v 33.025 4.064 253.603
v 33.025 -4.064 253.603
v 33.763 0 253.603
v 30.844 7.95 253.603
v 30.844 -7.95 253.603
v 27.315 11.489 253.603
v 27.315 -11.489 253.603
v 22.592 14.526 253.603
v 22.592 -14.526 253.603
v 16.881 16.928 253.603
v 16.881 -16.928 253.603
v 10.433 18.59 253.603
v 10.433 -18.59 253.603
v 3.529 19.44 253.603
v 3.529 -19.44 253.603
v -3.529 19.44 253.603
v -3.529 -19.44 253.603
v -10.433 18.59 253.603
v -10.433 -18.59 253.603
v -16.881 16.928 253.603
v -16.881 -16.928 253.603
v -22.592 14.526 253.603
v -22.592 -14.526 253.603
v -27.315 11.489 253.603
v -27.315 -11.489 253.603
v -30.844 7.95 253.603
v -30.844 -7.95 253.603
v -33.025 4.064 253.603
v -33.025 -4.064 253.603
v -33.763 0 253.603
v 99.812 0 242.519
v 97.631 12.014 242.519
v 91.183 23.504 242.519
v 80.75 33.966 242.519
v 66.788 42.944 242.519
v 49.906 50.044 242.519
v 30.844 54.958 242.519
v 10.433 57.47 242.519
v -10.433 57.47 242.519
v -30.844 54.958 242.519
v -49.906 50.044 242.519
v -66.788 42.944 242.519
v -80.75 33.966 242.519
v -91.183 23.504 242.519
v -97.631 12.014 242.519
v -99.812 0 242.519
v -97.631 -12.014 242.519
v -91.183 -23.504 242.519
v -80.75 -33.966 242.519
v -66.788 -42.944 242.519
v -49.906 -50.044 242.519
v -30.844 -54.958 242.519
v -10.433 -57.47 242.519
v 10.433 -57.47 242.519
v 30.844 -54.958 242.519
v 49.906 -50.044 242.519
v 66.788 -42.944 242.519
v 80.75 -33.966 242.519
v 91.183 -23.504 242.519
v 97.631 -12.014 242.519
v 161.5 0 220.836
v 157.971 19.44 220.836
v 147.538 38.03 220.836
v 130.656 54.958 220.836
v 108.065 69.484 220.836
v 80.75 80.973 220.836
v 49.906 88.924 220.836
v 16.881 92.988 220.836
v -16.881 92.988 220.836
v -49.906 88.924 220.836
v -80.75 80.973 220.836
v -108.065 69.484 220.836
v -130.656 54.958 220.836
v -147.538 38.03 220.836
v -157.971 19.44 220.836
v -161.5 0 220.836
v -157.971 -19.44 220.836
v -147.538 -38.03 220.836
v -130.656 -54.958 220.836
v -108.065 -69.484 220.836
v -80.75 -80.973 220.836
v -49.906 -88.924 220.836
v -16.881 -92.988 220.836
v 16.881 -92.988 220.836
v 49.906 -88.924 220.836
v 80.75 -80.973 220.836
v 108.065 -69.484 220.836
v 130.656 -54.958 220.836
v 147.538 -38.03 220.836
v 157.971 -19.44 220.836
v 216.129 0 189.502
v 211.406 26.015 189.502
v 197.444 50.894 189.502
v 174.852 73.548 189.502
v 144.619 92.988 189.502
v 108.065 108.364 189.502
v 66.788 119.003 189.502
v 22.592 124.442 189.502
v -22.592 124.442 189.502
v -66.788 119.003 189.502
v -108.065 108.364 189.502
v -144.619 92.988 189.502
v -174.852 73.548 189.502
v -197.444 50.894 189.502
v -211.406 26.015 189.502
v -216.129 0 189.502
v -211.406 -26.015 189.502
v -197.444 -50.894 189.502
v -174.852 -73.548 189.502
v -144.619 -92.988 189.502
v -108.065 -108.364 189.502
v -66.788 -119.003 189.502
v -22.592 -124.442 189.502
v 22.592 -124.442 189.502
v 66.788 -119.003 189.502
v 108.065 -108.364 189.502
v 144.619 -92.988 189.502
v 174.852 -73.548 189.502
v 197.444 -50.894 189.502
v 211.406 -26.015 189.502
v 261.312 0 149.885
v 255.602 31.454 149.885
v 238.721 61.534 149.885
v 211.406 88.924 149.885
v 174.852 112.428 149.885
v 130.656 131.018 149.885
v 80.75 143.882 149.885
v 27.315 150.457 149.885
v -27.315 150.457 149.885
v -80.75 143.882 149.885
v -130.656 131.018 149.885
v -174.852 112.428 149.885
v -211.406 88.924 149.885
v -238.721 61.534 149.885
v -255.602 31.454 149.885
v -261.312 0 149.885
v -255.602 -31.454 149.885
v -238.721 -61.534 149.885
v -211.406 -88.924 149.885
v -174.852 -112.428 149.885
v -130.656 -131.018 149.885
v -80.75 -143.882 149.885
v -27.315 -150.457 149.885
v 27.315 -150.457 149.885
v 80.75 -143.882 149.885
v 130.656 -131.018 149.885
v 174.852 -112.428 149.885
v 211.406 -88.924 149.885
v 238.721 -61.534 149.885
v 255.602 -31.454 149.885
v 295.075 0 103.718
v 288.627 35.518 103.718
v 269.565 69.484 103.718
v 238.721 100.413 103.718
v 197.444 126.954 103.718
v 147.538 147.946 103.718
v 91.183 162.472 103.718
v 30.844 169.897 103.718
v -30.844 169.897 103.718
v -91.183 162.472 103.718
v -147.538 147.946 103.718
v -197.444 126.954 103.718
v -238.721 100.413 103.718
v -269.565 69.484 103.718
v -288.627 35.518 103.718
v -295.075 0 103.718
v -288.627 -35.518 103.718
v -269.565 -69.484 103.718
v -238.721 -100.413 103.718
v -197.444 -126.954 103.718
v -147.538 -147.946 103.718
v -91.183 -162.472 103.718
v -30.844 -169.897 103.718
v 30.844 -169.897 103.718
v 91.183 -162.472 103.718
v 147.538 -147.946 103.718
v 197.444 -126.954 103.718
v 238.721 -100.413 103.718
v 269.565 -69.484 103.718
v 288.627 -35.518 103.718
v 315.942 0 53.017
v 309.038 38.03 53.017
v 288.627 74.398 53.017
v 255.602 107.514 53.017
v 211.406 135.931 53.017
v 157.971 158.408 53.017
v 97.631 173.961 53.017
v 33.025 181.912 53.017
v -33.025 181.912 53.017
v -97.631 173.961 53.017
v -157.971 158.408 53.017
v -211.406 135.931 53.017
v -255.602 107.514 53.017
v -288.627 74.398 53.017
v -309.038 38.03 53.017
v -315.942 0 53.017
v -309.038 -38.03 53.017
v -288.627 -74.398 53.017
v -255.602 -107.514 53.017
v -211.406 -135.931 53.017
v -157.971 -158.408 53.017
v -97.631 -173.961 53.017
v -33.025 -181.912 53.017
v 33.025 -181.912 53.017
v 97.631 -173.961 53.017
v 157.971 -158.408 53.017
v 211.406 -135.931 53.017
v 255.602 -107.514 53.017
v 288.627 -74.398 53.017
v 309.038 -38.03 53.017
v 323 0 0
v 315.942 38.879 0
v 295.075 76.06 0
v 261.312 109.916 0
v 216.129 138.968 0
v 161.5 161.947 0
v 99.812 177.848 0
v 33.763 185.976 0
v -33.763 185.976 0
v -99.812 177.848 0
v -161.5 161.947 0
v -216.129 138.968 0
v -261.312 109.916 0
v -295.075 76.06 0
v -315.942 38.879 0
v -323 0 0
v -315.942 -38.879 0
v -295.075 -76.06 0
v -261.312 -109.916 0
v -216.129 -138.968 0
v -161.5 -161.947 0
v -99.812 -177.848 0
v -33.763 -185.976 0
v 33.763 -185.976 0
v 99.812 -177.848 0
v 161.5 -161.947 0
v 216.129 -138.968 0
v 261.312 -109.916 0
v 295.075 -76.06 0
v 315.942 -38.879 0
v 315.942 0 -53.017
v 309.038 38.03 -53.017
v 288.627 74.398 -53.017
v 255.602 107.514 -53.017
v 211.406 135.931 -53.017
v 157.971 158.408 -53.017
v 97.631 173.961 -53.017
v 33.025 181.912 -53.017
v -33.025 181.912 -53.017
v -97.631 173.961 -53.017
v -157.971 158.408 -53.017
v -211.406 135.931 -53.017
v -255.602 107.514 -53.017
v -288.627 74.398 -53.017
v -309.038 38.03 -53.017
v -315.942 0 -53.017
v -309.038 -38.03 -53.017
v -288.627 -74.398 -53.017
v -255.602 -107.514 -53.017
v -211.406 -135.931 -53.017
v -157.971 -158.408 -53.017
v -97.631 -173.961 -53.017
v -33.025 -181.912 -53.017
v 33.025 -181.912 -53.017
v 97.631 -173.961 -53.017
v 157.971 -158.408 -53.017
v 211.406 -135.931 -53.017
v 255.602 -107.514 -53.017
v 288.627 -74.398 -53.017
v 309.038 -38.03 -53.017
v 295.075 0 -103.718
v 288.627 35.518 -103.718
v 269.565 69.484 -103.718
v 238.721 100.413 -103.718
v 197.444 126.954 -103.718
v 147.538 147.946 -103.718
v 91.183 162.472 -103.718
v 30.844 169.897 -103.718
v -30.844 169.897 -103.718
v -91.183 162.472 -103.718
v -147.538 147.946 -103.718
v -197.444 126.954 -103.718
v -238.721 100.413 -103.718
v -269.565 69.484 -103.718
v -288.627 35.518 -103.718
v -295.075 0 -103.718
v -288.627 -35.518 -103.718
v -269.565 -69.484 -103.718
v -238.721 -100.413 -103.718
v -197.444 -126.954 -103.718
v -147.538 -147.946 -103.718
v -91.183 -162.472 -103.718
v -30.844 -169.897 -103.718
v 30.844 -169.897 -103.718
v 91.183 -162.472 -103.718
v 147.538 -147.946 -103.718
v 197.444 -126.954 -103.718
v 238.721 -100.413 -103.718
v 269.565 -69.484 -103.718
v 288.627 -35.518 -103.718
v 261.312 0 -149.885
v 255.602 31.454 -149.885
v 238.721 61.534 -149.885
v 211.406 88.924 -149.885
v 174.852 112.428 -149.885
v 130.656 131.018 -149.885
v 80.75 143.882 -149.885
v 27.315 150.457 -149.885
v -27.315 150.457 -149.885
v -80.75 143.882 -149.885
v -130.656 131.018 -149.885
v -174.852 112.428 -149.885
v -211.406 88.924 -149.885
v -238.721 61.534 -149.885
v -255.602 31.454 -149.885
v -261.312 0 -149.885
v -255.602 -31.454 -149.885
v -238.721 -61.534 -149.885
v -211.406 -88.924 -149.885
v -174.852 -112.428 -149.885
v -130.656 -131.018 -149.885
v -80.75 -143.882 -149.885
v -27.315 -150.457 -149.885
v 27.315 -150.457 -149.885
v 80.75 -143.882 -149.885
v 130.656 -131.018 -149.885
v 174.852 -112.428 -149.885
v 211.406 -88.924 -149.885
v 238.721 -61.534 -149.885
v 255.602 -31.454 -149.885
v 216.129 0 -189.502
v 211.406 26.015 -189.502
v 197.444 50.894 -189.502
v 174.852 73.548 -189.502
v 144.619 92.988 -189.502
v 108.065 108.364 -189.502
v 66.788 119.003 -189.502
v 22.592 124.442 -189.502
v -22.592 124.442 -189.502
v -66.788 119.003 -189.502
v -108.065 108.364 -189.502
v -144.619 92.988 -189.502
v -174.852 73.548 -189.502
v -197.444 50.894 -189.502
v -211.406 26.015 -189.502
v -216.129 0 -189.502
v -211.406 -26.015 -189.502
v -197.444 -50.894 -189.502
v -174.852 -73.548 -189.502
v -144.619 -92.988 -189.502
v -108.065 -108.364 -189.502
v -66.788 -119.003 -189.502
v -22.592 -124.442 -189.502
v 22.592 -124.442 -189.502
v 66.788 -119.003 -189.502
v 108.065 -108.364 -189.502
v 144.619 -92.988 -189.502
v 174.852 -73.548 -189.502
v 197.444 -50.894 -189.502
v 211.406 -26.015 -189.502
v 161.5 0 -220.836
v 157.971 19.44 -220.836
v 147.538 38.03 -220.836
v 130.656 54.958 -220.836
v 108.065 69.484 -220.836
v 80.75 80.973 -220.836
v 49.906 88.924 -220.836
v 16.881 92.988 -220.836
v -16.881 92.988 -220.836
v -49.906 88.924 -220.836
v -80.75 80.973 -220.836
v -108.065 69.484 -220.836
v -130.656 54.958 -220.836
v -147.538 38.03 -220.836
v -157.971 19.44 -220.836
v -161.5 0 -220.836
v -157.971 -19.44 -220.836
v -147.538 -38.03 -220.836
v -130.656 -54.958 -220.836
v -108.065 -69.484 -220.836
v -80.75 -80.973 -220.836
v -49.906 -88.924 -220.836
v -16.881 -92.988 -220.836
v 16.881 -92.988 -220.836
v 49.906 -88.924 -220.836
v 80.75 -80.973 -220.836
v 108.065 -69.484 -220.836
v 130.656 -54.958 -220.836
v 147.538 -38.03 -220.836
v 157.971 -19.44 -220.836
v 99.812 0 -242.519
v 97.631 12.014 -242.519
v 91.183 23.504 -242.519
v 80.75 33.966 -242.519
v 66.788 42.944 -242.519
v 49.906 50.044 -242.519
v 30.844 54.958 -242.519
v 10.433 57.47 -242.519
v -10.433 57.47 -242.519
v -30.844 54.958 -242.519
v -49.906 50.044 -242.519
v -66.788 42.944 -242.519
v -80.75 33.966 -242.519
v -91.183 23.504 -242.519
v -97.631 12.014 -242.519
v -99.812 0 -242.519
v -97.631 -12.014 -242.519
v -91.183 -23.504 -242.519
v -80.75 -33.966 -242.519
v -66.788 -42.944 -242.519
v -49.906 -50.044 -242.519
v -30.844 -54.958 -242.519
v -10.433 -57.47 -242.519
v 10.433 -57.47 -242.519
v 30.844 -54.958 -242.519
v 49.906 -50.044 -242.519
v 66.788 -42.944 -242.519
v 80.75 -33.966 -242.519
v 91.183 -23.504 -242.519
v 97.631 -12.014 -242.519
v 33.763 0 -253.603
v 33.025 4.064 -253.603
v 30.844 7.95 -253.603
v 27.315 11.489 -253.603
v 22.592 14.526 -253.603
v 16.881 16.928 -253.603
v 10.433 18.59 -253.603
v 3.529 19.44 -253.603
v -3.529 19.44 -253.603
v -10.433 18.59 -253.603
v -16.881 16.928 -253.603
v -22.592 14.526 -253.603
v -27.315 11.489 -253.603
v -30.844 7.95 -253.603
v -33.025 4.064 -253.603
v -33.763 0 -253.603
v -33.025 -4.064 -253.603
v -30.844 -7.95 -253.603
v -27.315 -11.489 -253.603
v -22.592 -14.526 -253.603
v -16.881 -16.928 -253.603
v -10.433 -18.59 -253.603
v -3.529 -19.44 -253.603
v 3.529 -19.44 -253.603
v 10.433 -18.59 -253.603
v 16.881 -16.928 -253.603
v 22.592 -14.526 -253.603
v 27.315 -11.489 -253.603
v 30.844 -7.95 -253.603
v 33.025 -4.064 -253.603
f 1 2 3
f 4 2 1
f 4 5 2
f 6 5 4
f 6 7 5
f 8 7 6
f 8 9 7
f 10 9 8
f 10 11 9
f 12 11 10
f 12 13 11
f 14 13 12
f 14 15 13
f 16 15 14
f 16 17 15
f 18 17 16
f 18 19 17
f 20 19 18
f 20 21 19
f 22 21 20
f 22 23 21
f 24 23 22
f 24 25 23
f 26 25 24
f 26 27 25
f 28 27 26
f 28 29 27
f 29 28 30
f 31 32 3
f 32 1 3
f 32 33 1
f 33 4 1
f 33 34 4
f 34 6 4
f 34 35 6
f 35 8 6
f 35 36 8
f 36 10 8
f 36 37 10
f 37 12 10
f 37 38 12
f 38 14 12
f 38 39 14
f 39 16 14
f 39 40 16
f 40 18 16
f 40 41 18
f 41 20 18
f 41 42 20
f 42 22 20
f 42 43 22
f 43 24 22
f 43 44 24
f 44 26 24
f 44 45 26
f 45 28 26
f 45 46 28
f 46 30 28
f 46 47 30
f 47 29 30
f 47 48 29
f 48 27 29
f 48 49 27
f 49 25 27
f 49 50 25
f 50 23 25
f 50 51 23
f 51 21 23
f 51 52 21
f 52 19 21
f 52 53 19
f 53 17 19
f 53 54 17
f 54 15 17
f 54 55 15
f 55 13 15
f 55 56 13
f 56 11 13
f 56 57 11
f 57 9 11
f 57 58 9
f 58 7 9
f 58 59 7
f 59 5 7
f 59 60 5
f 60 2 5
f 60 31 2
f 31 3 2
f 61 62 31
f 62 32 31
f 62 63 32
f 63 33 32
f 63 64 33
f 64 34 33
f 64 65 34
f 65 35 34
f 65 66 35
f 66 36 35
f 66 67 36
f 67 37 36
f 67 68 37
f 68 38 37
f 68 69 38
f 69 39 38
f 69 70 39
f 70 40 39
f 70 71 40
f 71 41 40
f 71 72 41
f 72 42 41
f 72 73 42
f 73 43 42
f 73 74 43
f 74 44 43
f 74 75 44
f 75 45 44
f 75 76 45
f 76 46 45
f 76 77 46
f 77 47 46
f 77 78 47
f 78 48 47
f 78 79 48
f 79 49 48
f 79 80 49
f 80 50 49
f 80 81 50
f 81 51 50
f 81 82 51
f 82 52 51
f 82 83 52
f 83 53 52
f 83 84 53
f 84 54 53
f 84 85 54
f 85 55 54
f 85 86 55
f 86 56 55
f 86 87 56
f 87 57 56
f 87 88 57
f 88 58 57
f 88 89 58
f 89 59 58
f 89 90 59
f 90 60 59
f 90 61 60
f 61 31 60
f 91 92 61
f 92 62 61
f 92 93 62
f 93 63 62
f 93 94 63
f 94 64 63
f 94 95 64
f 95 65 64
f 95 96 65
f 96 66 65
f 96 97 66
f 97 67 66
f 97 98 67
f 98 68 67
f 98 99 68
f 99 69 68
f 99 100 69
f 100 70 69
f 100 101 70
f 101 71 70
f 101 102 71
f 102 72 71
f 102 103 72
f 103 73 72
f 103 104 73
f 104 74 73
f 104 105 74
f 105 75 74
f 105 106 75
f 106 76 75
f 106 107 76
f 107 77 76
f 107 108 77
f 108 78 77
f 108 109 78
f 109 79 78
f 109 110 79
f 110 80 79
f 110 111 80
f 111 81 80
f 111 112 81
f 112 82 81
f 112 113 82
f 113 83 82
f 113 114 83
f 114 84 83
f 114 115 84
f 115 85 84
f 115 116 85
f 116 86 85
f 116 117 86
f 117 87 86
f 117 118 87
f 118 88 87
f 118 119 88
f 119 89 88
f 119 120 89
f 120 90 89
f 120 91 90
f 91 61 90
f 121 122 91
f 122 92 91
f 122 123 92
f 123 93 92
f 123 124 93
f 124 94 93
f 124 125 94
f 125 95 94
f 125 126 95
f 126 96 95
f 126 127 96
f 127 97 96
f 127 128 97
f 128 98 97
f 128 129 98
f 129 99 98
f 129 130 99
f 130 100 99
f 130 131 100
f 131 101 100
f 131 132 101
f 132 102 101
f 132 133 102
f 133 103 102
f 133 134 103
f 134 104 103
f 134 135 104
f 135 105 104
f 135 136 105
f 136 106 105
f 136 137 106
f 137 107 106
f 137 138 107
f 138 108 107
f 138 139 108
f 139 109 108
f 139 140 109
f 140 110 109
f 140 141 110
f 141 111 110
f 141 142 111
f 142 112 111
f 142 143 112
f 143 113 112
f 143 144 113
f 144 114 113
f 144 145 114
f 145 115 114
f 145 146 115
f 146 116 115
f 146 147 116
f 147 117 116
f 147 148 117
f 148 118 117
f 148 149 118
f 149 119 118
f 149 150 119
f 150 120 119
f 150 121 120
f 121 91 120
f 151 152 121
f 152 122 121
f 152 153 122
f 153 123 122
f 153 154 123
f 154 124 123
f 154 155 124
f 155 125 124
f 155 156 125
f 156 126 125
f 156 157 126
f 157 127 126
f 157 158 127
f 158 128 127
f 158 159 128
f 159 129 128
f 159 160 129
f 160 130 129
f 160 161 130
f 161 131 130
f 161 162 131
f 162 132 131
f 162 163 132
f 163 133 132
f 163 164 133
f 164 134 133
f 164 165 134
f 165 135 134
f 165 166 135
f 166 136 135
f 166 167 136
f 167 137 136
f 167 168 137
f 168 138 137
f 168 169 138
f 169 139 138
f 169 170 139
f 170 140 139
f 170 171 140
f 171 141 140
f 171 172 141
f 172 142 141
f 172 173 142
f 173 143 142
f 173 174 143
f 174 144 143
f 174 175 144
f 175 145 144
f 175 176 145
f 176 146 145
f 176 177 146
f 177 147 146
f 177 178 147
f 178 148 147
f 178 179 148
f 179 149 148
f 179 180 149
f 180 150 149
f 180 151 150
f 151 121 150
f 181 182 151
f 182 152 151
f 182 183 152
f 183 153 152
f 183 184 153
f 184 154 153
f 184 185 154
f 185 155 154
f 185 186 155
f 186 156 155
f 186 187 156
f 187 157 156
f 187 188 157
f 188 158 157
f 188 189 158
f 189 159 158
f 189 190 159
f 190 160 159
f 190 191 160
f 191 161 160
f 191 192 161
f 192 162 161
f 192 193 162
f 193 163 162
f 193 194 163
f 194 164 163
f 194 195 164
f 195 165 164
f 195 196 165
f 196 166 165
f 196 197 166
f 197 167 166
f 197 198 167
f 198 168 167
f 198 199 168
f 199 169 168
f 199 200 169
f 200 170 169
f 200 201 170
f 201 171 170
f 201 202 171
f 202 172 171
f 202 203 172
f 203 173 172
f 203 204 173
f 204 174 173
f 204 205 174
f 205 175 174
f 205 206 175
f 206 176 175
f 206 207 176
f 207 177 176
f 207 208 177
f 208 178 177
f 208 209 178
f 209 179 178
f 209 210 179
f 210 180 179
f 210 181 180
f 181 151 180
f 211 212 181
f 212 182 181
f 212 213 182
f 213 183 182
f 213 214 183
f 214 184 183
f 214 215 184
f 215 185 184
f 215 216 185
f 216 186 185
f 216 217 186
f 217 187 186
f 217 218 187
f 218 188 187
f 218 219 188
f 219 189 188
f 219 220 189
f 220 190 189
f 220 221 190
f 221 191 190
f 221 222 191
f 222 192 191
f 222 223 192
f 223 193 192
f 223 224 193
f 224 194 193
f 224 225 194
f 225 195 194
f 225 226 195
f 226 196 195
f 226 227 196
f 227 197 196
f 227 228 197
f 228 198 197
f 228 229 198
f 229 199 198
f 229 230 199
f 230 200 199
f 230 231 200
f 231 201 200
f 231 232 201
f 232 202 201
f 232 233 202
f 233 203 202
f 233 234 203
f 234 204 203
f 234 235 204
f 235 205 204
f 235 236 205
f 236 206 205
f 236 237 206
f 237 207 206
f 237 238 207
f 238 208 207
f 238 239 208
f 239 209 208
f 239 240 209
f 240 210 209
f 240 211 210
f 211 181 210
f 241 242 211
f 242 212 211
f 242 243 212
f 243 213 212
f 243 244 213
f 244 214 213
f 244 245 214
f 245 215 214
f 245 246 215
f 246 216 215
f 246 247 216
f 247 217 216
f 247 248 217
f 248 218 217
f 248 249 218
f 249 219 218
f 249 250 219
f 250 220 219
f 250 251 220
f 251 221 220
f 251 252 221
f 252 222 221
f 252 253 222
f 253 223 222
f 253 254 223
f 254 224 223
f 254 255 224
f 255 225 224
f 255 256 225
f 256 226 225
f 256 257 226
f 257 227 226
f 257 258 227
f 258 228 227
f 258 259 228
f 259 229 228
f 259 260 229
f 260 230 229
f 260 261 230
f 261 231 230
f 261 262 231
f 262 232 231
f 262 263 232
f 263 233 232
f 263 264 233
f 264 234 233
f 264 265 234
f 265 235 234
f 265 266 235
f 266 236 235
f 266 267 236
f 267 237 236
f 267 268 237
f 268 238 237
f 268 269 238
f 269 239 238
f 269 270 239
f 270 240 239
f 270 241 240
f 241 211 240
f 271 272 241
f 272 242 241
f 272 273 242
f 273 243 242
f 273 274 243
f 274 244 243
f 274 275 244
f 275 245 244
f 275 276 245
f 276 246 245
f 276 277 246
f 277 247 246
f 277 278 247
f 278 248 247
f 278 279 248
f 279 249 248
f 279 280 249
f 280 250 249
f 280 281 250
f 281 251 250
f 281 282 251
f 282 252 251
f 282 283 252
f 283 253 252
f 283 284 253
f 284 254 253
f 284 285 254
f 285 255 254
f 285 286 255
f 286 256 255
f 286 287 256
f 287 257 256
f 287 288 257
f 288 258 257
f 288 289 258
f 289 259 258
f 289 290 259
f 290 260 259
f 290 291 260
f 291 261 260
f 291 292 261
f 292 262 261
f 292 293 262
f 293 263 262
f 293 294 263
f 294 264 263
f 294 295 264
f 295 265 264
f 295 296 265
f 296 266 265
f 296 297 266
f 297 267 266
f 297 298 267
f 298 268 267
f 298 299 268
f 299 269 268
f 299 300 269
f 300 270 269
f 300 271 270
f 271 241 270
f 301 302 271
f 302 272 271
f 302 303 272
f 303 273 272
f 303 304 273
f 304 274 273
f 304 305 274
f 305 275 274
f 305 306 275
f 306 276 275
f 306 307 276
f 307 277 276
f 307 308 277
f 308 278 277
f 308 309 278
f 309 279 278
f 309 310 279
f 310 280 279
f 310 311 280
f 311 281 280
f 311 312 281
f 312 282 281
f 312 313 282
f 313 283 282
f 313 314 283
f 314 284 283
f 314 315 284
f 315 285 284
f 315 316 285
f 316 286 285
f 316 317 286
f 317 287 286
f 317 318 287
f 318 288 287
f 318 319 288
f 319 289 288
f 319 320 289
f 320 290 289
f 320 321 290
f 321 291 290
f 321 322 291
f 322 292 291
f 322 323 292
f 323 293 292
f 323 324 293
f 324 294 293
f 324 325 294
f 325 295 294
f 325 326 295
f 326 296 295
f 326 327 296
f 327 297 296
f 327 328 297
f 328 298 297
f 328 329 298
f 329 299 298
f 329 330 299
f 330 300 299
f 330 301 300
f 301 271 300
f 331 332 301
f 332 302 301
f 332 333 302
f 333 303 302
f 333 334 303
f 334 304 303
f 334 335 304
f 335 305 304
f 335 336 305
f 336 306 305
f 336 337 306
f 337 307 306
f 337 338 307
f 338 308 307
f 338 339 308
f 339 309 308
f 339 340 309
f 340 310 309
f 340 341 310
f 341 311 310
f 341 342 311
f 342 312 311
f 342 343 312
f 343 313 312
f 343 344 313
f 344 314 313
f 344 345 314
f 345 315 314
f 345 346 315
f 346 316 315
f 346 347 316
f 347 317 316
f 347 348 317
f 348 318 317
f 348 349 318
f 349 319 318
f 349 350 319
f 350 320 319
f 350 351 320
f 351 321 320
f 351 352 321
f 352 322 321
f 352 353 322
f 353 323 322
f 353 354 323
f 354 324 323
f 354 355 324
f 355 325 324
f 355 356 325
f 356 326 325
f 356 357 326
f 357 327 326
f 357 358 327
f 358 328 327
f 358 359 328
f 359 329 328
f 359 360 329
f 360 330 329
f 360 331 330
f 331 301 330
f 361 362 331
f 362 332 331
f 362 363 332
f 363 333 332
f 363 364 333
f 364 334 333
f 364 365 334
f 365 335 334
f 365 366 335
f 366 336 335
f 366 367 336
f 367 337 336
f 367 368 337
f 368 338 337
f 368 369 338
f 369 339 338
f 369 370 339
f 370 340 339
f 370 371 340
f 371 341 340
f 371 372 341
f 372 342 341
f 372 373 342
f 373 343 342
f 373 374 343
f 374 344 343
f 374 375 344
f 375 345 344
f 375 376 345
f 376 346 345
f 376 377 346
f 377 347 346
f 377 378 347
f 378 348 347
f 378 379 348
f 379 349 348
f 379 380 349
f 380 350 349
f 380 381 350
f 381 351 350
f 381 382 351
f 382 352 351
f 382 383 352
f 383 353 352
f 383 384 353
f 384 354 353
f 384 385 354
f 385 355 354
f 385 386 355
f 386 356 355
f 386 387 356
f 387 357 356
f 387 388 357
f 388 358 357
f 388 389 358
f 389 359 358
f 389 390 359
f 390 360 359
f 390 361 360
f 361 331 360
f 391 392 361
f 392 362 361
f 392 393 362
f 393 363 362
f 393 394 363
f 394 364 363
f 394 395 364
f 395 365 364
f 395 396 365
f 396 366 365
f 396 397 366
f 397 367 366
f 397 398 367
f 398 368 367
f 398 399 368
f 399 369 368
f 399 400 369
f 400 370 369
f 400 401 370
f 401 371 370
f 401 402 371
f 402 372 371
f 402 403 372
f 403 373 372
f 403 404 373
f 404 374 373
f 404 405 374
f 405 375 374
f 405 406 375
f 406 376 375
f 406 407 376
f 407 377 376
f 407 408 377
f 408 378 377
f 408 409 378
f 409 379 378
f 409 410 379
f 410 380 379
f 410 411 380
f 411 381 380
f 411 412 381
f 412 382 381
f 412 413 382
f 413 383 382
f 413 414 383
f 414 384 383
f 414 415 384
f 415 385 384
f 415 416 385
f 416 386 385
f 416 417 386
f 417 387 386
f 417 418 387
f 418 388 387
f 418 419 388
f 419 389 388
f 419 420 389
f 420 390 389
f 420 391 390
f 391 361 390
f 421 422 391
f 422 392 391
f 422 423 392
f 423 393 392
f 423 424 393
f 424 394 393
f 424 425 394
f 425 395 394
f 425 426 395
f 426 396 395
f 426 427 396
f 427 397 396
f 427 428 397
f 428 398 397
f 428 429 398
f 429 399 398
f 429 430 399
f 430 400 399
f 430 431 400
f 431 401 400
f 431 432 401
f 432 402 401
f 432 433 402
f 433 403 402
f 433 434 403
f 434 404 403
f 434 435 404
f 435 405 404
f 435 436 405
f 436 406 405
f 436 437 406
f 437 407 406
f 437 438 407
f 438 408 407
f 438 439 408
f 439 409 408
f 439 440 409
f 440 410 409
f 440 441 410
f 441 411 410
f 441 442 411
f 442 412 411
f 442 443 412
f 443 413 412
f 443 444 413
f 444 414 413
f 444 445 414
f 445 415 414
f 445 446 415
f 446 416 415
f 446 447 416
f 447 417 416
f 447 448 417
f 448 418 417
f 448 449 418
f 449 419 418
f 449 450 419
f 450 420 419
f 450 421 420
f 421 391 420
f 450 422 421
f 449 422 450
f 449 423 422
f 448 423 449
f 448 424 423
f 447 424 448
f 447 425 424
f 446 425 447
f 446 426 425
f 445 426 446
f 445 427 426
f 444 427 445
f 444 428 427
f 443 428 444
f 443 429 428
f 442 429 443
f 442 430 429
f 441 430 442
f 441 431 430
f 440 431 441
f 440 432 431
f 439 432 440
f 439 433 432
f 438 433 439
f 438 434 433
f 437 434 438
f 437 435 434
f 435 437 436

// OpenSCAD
// Generated by SolidPython 1.0.1 on 2020-07-29 00:46:54


scale(v = [19, 11, 15]) {
	sphere(r = 17);
}
/***********************************************
*********      SolidPython code:      **********
************************************************
 
# import packages: SolidPython
from solid import *
from solid.utils import *
from itertools import chain, combinations, permutations


class Resize:

    def __init__(self, scad_file):
        self.scad_file = scad_file
        #self.scad_file = import_scad(scad_file)
        # cone/cylinder param:
        self.r1 = 0
        self.r2 = 0
        self.h = 0
        # rectangular prism param:
        self.w = 0
        self.l = 0
        # ellipse param:
        self.r = 0

    # import OpenScad code (file name corresponds to shape)


    # classify shape + parameters
    def assign(self, param1, param2, param3):
        if self.scad_file == 'cone.scad':
            self.r1 = param1
            self.r2 = param2
            self.h = param3
        elif self.scad_file == 'cylinder.scad':
            self.r1 = param1
            self.r2 = param2
            self.h = param3
        elif self.scad_file == 'rectangularPrism.scad':
            self.h = param1
            self.l = param2
            self.w = param3
        else:
            self.r = param1
            self.h = param2

    # resize parameters
    def iterate(self):
        x = range(3, 20, 2)
        i = 1
        if self.scad_file == 'cone.scad':
            tempList = list(permutations(x, 2))
            for temp in tempList:
                param1 = temp[0]
                param2 = temp[1]
                filepath = 'produced_scad_files/' + 'cone' + str(param1) + '_' + str(param2) + '_' + '.scad'
                scad_render_to_file(cylinder(h=param1, r1=param2, r2=0), filepath)

        elif self.scad_file == 'cylinder.scad':
            tempList = list(permutations(x, 3))
            for temp in tempList:
                param1 = temp[0]
                param2 = temp[1]
                filepath = 'produced_scad_files/' + 'cylinder' + str(param1) + '_' + str(param2) + '_' + '.scad'
                scad_render_to_file(cylinder(h=param1, r1=param2, r2=param2), filepath)

        elif self.scad_file == 'rectangularPrism.scad':
            tempList = list(permutations(x, 3))
            for temp in tempList:
                param1 = temp[0]
                param2 = temp[1]
                param3 = temp[2]
                filepath = 'produced_scad_files/' + 'rectangularPrism' + str(param1) + '_' + str(param2) + '_' + str(
                    param3) + '.scad'
                scad_render_to_file(cube(size=(param1, param2, param3)), filepath)

        elif self.scad_file == 'ellipse.scad':
            tempList = list(permutations(x, 4))
            for temp in tempList:
                param1 = temp[0]
                param2 = temp[1]
                param3 = temp[2]
                param4 = temp[3]
                filepath = 'produced_scad_files/' + 'ellipse' + str(param1) + '_' + str(param2) + '_' + str(param3) + '_' + str(param4) + '.scad'
                scad_render_to_file(scale([param1, param2, param3])(sphere(r=param4)), filepath)

    def render_to_scadfile(self):
        scad_render_to_file(scad, 'example.scad') 
 
************************************************/
